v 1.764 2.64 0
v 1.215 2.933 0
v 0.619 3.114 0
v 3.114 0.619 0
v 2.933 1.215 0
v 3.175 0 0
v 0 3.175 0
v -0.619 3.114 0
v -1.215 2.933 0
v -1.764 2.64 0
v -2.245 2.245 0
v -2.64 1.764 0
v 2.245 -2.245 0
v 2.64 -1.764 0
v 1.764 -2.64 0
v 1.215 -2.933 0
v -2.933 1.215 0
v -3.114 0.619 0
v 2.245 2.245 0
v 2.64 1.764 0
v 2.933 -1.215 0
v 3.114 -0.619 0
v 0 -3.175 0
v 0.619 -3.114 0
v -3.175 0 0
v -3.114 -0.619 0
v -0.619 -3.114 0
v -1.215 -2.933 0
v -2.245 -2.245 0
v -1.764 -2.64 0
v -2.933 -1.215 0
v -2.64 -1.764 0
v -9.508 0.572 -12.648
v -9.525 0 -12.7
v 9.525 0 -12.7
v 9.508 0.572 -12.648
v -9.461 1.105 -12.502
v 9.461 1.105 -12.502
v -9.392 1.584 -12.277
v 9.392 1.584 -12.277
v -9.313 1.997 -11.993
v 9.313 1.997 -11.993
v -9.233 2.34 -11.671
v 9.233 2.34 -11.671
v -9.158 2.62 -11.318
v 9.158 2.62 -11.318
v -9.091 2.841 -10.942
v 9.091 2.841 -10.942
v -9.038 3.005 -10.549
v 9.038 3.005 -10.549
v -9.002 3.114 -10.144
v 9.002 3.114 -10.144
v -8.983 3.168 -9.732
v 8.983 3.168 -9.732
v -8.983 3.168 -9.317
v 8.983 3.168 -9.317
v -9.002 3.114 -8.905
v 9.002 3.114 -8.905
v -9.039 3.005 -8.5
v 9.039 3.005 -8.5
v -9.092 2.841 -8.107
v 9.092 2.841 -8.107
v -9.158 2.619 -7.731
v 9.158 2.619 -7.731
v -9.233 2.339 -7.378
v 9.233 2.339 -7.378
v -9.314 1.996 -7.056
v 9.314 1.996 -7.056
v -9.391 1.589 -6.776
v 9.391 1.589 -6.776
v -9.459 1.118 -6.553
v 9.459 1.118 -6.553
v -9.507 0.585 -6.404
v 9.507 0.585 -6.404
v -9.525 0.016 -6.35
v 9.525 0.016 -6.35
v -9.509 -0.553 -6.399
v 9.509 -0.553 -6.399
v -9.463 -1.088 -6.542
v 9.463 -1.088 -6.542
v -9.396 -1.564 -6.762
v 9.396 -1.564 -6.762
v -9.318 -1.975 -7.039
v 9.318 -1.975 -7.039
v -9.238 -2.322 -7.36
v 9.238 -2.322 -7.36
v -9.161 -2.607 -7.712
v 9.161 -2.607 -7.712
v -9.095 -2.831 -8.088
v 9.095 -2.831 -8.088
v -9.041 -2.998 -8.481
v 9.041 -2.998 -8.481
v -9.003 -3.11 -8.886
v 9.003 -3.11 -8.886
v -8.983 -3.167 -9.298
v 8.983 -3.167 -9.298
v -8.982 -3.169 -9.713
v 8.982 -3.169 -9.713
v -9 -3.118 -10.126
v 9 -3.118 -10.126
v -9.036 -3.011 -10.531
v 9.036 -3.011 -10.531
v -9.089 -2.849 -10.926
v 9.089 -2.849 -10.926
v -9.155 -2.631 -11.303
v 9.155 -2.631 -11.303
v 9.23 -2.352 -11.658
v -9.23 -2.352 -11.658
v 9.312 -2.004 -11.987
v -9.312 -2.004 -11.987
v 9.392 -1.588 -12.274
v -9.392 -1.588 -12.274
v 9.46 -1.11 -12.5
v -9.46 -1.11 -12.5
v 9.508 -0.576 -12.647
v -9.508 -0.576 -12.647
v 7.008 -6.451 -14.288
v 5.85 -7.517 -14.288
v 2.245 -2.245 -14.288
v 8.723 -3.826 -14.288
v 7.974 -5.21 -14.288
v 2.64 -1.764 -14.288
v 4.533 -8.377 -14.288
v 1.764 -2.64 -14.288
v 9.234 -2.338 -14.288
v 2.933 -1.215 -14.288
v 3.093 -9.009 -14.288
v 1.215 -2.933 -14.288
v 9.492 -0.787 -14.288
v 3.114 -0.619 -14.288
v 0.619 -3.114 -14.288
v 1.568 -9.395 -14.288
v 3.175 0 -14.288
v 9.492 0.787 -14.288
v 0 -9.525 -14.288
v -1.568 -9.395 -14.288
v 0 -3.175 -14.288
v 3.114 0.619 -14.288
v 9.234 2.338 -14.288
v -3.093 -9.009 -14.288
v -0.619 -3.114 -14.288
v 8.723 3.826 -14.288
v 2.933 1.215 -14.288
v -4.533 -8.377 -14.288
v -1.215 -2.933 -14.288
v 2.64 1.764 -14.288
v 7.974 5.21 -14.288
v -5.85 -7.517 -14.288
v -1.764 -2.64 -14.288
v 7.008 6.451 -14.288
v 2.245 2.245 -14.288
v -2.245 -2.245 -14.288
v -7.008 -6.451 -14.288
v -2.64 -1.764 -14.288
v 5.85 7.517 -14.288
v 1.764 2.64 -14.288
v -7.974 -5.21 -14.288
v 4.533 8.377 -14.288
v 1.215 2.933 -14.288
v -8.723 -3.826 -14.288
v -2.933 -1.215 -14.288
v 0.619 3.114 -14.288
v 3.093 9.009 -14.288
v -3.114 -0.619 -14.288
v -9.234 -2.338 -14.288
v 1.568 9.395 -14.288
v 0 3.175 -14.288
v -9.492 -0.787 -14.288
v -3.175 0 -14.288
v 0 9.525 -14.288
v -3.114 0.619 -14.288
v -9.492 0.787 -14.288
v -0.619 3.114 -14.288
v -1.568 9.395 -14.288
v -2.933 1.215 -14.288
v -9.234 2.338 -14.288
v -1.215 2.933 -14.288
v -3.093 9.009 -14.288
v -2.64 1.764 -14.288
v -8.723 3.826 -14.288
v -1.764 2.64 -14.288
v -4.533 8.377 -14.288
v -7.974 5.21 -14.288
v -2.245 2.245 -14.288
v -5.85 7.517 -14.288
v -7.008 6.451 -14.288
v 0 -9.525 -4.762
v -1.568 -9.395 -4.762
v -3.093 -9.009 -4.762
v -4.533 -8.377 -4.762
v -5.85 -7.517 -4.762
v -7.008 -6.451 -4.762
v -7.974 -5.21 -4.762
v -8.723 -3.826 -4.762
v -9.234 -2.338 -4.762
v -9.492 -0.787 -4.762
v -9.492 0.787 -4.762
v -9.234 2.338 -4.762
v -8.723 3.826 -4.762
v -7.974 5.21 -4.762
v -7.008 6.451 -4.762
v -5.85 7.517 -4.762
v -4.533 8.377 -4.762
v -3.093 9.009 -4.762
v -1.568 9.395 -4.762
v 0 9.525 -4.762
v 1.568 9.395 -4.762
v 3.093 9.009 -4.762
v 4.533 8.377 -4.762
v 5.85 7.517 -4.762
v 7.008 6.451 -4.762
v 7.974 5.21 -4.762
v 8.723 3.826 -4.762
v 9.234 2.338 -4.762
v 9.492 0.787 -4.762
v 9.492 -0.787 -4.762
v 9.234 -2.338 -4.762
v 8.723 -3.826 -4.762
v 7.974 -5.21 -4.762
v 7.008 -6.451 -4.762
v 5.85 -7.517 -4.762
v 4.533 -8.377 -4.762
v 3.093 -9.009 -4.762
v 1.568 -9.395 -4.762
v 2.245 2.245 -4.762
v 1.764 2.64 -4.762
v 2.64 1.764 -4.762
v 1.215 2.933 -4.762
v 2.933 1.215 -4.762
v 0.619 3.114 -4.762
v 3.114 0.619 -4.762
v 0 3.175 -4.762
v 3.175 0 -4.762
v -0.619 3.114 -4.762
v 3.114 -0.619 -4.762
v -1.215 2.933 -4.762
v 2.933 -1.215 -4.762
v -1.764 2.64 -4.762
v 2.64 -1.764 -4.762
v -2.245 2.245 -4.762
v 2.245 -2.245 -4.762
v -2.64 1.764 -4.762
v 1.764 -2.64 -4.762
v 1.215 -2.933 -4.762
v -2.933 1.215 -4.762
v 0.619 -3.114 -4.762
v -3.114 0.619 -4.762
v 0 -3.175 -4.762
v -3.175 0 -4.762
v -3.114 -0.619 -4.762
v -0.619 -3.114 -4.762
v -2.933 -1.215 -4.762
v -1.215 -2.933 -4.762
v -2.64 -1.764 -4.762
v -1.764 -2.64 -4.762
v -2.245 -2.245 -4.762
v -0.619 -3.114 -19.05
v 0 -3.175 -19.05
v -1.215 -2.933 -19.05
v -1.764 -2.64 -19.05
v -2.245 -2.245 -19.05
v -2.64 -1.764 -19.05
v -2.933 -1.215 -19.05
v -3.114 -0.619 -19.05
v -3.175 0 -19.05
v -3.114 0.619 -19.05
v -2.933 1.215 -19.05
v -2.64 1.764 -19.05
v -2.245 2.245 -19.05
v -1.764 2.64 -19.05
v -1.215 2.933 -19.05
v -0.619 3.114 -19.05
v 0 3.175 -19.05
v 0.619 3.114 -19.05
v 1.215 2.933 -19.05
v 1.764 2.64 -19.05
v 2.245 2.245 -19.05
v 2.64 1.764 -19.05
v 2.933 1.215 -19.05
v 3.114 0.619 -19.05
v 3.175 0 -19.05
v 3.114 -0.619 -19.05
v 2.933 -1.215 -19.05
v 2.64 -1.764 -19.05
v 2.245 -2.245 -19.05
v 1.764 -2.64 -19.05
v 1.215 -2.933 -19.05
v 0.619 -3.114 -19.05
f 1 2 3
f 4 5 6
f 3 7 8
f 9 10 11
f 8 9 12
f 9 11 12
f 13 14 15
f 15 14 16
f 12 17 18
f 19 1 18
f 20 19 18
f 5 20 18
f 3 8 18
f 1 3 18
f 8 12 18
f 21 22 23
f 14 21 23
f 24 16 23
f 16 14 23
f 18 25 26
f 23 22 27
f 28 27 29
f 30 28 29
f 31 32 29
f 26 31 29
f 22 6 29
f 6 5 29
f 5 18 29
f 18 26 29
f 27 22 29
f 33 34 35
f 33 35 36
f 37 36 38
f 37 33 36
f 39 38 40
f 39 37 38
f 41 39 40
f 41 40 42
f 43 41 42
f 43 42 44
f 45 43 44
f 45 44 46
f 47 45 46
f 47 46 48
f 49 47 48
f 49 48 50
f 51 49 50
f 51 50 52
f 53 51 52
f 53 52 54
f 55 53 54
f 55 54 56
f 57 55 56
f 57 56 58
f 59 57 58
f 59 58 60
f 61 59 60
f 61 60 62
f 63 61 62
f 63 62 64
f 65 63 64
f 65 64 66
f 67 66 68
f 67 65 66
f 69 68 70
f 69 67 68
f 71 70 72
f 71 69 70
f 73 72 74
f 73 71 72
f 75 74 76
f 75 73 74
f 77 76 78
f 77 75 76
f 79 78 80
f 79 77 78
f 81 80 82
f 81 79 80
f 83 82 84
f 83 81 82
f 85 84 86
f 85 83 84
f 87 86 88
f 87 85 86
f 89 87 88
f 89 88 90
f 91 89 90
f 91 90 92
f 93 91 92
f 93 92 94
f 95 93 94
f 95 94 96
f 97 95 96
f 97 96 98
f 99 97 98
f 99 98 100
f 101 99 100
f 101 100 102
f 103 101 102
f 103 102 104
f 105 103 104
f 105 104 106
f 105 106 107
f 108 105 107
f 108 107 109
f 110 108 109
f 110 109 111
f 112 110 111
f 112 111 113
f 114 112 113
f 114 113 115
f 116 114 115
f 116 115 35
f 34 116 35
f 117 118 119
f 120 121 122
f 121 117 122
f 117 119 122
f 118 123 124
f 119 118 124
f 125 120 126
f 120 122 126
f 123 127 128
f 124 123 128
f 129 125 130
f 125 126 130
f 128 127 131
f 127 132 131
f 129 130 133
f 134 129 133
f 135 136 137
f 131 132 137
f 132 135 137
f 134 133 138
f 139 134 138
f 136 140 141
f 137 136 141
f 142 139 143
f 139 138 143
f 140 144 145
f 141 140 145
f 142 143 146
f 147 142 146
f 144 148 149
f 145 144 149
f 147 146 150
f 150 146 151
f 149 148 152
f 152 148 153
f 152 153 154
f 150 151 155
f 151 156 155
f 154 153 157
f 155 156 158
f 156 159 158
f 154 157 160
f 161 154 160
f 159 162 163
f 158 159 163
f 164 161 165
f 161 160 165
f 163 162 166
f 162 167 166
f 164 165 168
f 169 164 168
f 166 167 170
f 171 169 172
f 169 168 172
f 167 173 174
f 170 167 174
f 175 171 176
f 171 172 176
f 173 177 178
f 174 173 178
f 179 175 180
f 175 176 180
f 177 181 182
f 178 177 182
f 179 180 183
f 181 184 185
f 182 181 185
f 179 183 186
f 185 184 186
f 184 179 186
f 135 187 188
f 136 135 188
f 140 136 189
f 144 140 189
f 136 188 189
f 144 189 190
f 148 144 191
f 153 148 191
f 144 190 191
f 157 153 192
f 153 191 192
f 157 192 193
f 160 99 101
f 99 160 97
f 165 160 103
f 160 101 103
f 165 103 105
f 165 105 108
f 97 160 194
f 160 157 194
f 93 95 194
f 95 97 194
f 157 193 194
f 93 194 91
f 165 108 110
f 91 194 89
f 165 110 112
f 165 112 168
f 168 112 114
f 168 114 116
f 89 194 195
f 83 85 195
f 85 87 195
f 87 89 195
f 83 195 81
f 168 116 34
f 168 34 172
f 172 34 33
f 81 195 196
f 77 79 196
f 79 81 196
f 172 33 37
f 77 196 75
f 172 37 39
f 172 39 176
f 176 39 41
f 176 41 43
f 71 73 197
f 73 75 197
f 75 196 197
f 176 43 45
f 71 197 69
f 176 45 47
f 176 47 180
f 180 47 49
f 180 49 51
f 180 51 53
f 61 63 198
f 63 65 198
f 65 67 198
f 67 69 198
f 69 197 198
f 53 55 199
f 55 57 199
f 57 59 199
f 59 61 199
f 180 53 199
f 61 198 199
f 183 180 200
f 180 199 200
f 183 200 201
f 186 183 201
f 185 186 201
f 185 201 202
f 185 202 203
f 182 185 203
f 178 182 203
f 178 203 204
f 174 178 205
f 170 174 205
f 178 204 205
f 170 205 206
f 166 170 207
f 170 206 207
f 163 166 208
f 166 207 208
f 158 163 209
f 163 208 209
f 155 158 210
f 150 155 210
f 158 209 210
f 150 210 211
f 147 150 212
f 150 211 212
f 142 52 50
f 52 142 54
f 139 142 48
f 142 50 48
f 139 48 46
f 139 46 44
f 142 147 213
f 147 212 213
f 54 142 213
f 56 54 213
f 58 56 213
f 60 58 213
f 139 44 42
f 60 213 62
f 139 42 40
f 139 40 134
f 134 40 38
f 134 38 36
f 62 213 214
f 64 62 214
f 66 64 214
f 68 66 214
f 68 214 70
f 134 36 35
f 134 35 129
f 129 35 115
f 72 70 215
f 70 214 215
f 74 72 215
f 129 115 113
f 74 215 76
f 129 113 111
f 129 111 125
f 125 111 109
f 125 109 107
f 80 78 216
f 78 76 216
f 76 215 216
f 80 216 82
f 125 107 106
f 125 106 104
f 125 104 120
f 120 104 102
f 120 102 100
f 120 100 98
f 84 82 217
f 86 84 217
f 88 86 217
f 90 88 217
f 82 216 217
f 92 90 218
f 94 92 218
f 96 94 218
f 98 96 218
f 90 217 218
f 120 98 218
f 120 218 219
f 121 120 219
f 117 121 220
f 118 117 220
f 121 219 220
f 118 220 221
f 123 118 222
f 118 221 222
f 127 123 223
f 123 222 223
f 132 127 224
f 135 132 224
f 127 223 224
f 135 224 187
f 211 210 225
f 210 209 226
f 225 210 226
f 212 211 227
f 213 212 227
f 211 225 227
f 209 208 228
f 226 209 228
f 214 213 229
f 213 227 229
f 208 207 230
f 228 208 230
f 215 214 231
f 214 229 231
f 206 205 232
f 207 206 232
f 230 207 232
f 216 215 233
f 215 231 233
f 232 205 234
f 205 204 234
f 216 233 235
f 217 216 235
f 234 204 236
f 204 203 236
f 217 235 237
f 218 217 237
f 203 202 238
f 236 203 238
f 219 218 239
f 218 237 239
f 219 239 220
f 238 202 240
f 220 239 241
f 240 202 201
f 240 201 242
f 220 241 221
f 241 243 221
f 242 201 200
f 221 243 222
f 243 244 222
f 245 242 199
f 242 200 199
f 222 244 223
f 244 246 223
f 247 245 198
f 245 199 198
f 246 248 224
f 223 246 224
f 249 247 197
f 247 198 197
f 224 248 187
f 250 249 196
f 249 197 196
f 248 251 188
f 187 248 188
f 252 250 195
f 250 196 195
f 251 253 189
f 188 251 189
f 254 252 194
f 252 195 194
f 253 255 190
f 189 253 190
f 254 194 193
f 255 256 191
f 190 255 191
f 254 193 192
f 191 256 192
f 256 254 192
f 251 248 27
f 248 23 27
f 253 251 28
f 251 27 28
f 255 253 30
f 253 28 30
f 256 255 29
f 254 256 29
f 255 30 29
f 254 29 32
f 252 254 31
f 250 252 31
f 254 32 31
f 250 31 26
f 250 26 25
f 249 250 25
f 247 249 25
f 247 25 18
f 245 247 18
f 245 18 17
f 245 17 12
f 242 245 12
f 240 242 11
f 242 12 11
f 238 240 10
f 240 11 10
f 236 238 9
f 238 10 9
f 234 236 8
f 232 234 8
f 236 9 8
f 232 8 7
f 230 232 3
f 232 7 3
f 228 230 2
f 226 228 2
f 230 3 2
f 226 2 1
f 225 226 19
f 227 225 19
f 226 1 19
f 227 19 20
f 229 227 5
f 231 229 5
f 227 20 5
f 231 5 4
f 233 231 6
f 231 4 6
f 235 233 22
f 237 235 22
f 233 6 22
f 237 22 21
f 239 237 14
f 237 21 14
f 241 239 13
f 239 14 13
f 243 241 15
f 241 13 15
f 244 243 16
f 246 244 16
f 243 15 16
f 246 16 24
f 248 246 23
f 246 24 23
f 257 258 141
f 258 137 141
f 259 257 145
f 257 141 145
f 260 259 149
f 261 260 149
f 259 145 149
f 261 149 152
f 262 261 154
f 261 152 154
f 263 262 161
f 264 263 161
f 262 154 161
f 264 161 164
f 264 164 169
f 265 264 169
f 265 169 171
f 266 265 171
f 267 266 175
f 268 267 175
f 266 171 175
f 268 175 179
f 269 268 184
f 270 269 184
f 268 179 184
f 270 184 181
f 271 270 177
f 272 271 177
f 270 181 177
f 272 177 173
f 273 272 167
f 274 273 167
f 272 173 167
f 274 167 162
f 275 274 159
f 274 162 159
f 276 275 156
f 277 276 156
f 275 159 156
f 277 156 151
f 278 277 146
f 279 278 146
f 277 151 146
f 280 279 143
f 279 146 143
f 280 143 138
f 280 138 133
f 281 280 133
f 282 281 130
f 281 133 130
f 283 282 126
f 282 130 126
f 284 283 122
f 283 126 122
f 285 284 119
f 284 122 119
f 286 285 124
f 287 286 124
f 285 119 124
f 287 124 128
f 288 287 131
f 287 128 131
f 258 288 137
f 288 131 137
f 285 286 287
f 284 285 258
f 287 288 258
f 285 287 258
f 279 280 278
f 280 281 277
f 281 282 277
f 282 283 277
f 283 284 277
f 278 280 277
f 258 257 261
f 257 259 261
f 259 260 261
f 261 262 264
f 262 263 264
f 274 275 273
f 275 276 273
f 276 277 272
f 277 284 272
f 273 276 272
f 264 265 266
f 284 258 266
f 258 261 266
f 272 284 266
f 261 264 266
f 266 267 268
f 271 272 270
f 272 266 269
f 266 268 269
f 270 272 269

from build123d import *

# Parameters (mm, degrees)
CUT_EXTRUDE1_DEPTH      = 24.3313898
CUT_EXTRUDE1_DEPTH_BACK = 24.3313898
SKETCH2_R               = 3.175


with BuildPart() as part:
    # Sketch1 → Revolve1 (revolve)
    with BuildSketch(Plane(origin=(0, 0, 0), x_dir=(0, 0, -1), z_dir=(1, 0, 0)), mode=Mode.PRIVATE) as revolve1_sk:
        Polygon((0, 0), (19.05, 0), (19.05, 3.175), (14.2875, 3.175), (14.2875, 9.525), (4.7625, 9.525), (4.7625, 3.175), (0, 3.175), align=None)
    revolve(revolve1_sk.sketch.rotate(Axis((0, 0, 0), (0, 0, -1)), 180), axis=Axis((0, 0, 0), (0, 0, -1)))

    # Sketch2 → Cut-Extrude1 (cut, two sides: drawn at the far end of the back side and taken through both)
    with BuildSketch(Plane(origin=(0, 0, 0), x_dir=(0, 0, -1), z_dir=(1, 0, 0)).offset(-CUT_EXTRUDE1_DEPTH_BACK)):
        with Locations((9.525, 0)):
            Circle(SKETCH2_R)
    extrude(amount=CUT_EXTRUDE1_DEPTH + CUT_EXTRUDE1_DEPTH_BACK, mode=Mode.SUBTRACT)


solid = part.part
